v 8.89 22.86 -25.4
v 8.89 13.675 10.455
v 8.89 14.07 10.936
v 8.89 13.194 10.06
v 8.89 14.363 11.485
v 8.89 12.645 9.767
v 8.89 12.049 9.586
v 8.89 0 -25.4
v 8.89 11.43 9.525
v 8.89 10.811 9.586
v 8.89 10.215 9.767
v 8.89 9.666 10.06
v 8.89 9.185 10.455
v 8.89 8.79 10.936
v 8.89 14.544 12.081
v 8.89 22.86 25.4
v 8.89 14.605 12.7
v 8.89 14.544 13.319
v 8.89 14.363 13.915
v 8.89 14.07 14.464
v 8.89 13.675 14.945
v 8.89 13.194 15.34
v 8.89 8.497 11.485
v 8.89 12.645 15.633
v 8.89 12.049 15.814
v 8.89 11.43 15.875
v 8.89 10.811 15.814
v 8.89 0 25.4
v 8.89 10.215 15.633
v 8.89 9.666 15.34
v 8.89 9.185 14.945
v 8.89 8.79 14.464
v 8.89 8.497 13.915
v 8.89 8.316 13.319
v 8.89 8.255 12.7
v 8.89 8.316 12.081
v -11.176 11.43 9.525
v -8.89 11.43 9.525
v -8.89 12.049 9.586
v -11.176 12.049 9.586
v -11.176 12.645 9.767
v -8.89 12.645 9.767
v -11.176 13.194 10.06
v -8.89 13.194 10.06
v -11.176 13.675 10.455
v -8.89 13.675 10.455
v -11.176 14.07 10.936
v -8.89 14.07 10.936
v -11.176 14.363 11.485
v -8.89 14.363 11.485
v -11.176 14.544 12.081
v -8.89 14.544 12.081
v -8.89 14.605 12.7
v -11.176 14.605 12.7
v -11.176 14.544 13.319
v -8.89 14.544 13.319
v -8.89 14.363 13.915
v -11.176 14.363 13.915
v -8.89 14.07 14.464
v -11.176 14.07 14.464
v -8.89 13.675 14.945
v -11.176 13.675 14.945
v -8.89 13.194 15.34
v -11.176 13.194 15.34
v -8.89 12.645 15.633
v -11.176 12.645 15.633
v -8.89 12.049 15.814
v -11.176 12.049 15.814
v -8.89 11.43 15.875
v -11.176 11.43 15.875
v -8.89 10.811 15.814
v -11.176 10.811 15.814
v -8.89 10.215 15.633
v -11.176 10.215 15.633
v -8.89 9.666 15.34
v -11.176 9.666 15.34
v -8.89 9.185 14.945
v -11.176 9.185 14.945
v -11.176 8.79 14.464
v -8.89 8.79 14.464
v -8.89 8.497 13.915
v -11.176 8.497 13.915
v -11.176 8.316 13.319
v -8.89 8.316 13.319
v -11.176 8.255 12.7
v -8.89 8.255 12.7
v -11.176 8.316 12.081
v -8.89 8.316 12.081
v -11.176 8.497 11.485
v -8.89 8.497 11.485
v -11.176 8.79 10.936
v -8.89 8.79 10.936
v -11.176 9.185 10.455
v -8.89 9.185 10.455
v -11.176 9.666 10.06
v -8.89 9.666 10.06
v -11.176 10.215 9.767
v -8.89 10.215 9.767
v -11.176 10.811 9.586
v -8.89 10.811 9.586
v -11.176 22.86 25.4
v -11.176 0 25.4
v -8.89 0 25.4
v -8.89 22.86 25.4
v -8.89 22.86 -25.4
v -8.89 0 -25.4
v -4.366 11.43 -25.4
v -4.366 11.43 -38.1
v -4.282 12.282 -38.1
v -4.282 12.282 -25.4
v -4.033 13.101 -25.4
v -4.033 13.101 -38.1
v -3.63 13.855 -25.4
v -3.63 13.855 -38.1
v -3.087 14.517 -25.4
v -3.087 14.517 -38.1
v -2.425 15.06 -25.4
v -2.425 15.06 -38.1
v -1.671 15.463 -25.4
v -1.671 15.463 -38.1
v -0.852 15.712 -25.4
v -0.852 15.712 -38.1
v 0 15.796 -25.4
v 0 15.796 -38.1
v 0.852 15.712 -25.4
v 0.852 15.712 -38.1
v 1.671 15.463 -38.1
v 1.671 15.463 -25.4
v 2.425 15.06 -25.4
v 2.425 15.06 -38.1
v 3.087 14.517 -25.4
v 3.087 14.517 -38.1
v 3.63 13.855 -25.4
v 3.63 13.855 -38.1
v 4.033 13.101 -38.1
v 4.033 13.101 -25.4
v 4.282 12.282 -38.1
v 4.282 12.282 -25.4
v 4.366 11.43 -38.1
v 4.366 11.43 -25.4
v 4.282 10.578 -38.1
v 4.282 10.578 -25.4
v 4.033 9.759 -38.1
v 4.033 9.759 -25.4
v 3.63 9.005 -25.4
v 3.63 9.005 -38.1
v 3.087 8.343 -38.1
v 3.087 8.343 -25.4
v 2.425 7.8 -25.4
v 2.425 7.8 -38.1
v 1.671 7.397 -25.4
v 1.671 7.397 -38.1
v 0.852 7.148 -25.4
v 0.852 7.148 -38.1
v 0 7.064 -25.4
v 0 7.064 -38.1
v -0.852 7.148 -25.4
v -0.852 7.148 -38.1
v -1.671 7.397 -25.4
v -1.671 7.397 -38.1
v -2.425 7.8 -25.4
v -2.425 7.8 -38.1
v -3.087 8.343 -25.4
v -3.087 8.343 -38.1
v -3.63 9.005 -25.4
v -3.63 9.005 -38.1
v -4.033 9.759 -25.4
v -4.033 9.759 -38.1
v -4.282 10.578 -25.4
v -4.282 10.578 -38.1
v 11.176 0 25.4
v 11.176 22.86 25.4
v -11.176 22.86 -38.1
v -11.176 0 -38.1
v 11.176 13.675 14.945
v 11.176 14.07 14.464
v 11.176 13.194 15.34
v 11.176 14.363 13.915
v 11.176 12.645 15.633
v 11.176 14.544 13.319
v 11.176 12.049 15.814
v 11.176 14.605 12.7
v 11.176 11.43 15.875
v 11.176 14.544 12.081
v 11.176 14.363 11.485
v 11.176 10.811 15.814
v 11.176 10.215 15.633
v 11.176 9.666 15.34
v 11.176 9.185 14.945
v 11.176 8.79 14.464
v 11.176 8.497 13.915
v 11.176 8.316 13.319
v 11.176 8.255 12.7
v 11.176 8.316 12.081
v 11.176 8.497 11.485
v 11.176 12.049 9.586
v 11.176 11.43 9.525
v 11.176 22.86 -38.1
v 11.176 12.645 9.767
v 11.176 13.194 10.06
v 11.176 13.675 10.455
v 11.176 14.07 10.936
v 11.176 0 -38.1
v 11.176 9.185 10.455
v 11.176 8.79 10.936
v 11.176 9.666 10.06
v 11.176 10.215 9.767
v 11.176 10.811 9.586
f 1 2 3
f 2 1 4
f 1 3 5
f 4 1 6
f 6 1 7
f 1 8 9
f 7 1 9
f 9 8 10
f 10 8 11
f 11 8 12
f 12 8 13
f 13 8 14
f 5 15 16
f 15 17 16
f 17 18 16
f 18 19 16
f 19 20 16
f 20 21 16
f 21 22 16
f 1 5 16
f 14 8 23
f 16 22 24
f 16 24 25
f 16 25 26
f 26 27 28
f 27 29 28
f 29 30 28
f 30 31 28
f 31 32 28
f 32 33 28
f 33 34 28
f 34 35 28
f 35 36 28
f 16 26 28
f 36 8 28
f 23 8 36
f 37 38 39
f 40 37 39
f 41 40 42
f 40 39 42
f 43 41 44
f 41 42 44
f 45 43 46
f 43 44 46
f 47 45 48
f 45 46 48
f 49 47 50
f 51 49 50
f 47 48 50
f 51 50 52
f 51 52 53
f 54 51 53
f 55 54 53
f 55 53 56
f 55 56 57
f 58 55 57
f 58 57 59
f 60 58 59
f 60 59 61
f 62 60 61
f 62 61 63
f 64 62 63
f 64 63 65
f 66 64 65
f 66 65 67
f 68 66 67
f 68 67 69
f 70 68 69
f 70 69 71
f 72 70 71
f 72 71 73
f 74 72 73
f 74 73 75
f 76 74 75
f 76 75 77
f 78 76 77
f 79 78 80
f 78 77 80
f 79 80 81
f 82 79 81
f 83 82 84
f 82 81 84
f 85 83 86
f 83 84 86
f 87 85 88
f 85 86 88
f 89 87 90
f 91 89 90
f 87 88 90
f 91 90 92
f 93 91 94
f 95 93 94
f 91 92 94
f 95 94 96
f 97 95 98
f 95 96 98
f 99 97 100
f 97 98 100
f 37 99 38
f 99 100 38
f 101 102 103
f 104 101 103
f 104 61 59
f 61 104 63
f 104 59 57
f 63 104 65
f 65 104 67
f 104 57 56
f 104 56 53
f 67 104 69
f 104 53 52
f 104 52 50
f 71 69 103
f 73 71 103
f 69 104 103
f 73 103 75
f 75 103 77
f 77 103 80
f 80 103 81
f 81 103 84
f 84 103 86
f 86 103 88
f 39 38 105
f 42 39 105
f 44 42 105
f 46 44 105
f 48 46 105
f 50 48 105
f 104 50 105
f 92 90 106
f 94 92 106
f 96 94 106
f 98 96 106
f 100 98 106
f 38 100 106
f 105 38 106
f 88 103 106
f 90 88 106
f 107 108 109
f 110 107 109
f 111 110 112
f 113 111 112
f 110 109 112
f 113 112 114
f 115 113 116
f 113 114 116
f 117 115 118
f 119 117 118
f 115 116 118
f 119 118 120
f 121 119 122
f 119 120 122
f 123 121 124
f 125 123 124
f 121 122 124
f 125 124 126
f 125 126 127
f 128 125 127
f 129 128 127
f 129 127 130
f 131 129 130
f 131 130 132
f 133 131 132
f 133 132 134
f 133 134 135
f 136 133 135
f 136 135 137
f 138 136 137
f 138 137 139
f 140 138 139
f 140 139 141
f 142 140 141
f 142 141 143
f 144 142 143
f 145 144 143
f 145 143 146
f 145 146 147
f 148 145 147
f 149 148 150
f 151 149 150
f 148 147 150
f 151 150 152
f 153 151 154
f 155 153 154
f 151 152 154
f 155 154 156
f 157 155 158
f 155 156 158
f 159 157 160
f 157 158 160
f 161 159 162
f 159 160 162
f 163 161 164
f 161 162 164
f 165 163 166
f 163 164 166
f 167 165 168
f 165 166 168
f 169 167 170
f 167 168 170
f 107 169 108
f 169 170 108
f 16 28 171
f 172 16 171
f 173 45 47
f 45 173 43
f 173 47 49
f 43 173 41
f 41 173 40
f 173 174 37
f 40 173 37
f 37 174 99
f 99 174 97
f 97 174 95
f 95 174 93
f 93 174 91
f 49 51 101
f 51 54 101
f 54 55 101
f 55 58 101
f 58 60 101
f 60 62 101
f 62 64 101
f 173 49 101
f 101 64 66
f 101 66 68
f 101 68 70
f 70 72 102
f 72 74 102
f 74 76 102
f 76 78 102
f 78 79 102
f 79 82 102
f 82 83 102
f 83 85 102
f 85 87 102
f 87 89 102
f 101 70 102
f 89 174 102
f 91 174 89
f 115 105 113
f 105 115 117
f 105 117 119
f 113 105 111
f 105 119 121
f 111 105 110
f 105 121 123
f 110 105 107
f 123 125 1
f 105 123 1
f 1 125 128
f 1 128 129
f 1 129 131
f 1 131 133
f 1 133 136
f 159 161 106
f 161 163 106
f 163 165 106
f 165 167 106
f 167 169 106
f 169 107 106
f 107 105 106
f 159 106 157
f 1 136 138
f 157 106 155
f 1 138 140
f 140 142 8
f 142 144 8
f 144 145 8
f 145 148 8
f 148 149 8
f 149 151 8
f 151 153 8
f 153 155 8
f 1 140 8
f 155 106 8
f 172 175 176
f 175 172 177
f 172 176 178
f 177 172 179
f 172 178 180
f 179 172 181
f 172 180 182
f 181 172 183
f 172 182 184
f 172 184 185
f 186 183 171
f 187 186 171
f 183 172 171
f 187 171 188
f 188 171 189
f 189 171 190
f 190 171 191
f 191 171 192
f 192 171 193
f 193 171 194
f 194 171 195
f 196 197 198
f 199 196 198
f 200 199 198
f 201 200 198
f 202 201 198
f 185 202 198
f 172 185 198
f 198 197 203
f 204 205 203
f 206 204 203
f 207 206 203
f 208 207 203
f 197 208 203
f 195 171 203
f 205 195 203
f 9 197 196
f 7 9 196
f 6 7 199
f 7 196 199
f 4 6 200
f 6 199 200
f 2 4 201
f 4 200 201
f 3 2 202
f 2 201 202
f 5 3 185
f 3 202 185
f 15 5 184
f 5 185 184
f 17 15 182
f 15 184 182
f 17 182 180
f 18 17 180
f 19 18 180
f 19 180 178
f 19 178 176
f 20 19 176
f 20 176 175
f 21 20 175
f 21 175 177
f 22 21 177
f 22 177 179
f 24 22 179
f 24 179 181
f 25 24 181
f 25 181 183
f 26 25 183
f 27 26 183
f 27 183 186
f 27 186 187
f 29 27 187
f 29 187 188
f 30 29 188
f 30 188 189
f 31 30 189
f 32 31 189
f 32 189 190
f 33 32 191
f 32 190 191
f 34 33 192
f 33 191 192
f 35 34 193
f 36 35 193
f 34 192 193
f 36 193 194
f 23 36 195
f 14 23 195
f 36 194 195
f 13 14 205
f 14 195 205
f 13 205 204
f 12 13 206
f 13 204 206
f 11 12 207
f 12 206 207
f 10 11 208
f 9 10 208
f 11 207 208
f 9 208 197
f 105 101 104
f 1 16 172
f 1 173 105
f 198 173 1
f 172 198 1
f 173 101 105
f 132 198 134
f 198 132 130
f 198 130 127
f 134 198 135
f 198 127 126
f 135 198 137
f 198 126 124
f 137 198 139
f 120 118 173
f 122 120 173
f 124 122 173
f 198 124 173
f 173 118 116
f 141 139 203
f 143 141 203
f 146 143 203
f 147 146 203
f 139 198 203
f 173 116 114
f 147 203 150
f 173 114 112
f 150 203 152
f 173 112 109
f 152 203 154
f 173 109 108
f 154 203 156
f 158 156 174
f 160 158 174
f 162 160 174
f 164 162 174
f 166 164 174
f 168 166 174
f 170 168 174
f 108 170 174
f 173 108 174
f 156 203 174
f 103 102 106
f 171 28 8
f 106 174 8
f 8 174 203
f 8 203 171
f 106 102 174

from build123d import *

# Parameters (mm, degrees)
BOSS_EXTRUDE1_DEPTH = 22.86
SKETCH2_R           = 3.175
CUT_EXTRUDE1_DEPTH  = 50.737325059
SKETCH3_R           = 4.365625
CUT_EXTRUDE2_DEPTH  = 23.622


with BuildPart() as part:
    # Sketch1 → Boss-Extrude1 (new body)
    with BuildSketch(Plane(origin=(0, 0, 0), x_dir=(1, 0, 0), z_dir=(0, 1, 0))):
        Polygon((-11.176, -25.4), (-8.89, -25.4), (-8.89, 25.4), (8.89, 25.4), (8.89, -25.4), (11.176, -25.4), (11.176, 38.1), (-11.176, 38.1), align=None)
    extrude(amount=BOSS_EXTRUDE1_DEPTH)

    # Sketch2 → Cut-Extrude1 (cut, through all)
    with BuildSketch(Plane(origin=(11.176, 0, 0), x_dir=(0, 0, -1), z_dir=(1, 0, 0))):
        with Locations((-12.7, 11.43)):
            Circle(SKETCH2_R)
    extrude(amount=-CUT_EXTRUDE1_DEPTH, mode=Mode.SUBTRACT)

    # Sketch3 → Cut-Extrude2 (cut)
    with BuildSketch(Plane(origin=(0, 0, -38.1), x_dir=(-1, 0, 0), z_dir=(0, 0, -1))):
        with Locations((0, 11.43)):
            Circle(SKETCH3_R)
    extrude(amount=-CUT_EXTRUDE2_DEPTH, mode=Mode.SUBTRACT)


solid = part.part
